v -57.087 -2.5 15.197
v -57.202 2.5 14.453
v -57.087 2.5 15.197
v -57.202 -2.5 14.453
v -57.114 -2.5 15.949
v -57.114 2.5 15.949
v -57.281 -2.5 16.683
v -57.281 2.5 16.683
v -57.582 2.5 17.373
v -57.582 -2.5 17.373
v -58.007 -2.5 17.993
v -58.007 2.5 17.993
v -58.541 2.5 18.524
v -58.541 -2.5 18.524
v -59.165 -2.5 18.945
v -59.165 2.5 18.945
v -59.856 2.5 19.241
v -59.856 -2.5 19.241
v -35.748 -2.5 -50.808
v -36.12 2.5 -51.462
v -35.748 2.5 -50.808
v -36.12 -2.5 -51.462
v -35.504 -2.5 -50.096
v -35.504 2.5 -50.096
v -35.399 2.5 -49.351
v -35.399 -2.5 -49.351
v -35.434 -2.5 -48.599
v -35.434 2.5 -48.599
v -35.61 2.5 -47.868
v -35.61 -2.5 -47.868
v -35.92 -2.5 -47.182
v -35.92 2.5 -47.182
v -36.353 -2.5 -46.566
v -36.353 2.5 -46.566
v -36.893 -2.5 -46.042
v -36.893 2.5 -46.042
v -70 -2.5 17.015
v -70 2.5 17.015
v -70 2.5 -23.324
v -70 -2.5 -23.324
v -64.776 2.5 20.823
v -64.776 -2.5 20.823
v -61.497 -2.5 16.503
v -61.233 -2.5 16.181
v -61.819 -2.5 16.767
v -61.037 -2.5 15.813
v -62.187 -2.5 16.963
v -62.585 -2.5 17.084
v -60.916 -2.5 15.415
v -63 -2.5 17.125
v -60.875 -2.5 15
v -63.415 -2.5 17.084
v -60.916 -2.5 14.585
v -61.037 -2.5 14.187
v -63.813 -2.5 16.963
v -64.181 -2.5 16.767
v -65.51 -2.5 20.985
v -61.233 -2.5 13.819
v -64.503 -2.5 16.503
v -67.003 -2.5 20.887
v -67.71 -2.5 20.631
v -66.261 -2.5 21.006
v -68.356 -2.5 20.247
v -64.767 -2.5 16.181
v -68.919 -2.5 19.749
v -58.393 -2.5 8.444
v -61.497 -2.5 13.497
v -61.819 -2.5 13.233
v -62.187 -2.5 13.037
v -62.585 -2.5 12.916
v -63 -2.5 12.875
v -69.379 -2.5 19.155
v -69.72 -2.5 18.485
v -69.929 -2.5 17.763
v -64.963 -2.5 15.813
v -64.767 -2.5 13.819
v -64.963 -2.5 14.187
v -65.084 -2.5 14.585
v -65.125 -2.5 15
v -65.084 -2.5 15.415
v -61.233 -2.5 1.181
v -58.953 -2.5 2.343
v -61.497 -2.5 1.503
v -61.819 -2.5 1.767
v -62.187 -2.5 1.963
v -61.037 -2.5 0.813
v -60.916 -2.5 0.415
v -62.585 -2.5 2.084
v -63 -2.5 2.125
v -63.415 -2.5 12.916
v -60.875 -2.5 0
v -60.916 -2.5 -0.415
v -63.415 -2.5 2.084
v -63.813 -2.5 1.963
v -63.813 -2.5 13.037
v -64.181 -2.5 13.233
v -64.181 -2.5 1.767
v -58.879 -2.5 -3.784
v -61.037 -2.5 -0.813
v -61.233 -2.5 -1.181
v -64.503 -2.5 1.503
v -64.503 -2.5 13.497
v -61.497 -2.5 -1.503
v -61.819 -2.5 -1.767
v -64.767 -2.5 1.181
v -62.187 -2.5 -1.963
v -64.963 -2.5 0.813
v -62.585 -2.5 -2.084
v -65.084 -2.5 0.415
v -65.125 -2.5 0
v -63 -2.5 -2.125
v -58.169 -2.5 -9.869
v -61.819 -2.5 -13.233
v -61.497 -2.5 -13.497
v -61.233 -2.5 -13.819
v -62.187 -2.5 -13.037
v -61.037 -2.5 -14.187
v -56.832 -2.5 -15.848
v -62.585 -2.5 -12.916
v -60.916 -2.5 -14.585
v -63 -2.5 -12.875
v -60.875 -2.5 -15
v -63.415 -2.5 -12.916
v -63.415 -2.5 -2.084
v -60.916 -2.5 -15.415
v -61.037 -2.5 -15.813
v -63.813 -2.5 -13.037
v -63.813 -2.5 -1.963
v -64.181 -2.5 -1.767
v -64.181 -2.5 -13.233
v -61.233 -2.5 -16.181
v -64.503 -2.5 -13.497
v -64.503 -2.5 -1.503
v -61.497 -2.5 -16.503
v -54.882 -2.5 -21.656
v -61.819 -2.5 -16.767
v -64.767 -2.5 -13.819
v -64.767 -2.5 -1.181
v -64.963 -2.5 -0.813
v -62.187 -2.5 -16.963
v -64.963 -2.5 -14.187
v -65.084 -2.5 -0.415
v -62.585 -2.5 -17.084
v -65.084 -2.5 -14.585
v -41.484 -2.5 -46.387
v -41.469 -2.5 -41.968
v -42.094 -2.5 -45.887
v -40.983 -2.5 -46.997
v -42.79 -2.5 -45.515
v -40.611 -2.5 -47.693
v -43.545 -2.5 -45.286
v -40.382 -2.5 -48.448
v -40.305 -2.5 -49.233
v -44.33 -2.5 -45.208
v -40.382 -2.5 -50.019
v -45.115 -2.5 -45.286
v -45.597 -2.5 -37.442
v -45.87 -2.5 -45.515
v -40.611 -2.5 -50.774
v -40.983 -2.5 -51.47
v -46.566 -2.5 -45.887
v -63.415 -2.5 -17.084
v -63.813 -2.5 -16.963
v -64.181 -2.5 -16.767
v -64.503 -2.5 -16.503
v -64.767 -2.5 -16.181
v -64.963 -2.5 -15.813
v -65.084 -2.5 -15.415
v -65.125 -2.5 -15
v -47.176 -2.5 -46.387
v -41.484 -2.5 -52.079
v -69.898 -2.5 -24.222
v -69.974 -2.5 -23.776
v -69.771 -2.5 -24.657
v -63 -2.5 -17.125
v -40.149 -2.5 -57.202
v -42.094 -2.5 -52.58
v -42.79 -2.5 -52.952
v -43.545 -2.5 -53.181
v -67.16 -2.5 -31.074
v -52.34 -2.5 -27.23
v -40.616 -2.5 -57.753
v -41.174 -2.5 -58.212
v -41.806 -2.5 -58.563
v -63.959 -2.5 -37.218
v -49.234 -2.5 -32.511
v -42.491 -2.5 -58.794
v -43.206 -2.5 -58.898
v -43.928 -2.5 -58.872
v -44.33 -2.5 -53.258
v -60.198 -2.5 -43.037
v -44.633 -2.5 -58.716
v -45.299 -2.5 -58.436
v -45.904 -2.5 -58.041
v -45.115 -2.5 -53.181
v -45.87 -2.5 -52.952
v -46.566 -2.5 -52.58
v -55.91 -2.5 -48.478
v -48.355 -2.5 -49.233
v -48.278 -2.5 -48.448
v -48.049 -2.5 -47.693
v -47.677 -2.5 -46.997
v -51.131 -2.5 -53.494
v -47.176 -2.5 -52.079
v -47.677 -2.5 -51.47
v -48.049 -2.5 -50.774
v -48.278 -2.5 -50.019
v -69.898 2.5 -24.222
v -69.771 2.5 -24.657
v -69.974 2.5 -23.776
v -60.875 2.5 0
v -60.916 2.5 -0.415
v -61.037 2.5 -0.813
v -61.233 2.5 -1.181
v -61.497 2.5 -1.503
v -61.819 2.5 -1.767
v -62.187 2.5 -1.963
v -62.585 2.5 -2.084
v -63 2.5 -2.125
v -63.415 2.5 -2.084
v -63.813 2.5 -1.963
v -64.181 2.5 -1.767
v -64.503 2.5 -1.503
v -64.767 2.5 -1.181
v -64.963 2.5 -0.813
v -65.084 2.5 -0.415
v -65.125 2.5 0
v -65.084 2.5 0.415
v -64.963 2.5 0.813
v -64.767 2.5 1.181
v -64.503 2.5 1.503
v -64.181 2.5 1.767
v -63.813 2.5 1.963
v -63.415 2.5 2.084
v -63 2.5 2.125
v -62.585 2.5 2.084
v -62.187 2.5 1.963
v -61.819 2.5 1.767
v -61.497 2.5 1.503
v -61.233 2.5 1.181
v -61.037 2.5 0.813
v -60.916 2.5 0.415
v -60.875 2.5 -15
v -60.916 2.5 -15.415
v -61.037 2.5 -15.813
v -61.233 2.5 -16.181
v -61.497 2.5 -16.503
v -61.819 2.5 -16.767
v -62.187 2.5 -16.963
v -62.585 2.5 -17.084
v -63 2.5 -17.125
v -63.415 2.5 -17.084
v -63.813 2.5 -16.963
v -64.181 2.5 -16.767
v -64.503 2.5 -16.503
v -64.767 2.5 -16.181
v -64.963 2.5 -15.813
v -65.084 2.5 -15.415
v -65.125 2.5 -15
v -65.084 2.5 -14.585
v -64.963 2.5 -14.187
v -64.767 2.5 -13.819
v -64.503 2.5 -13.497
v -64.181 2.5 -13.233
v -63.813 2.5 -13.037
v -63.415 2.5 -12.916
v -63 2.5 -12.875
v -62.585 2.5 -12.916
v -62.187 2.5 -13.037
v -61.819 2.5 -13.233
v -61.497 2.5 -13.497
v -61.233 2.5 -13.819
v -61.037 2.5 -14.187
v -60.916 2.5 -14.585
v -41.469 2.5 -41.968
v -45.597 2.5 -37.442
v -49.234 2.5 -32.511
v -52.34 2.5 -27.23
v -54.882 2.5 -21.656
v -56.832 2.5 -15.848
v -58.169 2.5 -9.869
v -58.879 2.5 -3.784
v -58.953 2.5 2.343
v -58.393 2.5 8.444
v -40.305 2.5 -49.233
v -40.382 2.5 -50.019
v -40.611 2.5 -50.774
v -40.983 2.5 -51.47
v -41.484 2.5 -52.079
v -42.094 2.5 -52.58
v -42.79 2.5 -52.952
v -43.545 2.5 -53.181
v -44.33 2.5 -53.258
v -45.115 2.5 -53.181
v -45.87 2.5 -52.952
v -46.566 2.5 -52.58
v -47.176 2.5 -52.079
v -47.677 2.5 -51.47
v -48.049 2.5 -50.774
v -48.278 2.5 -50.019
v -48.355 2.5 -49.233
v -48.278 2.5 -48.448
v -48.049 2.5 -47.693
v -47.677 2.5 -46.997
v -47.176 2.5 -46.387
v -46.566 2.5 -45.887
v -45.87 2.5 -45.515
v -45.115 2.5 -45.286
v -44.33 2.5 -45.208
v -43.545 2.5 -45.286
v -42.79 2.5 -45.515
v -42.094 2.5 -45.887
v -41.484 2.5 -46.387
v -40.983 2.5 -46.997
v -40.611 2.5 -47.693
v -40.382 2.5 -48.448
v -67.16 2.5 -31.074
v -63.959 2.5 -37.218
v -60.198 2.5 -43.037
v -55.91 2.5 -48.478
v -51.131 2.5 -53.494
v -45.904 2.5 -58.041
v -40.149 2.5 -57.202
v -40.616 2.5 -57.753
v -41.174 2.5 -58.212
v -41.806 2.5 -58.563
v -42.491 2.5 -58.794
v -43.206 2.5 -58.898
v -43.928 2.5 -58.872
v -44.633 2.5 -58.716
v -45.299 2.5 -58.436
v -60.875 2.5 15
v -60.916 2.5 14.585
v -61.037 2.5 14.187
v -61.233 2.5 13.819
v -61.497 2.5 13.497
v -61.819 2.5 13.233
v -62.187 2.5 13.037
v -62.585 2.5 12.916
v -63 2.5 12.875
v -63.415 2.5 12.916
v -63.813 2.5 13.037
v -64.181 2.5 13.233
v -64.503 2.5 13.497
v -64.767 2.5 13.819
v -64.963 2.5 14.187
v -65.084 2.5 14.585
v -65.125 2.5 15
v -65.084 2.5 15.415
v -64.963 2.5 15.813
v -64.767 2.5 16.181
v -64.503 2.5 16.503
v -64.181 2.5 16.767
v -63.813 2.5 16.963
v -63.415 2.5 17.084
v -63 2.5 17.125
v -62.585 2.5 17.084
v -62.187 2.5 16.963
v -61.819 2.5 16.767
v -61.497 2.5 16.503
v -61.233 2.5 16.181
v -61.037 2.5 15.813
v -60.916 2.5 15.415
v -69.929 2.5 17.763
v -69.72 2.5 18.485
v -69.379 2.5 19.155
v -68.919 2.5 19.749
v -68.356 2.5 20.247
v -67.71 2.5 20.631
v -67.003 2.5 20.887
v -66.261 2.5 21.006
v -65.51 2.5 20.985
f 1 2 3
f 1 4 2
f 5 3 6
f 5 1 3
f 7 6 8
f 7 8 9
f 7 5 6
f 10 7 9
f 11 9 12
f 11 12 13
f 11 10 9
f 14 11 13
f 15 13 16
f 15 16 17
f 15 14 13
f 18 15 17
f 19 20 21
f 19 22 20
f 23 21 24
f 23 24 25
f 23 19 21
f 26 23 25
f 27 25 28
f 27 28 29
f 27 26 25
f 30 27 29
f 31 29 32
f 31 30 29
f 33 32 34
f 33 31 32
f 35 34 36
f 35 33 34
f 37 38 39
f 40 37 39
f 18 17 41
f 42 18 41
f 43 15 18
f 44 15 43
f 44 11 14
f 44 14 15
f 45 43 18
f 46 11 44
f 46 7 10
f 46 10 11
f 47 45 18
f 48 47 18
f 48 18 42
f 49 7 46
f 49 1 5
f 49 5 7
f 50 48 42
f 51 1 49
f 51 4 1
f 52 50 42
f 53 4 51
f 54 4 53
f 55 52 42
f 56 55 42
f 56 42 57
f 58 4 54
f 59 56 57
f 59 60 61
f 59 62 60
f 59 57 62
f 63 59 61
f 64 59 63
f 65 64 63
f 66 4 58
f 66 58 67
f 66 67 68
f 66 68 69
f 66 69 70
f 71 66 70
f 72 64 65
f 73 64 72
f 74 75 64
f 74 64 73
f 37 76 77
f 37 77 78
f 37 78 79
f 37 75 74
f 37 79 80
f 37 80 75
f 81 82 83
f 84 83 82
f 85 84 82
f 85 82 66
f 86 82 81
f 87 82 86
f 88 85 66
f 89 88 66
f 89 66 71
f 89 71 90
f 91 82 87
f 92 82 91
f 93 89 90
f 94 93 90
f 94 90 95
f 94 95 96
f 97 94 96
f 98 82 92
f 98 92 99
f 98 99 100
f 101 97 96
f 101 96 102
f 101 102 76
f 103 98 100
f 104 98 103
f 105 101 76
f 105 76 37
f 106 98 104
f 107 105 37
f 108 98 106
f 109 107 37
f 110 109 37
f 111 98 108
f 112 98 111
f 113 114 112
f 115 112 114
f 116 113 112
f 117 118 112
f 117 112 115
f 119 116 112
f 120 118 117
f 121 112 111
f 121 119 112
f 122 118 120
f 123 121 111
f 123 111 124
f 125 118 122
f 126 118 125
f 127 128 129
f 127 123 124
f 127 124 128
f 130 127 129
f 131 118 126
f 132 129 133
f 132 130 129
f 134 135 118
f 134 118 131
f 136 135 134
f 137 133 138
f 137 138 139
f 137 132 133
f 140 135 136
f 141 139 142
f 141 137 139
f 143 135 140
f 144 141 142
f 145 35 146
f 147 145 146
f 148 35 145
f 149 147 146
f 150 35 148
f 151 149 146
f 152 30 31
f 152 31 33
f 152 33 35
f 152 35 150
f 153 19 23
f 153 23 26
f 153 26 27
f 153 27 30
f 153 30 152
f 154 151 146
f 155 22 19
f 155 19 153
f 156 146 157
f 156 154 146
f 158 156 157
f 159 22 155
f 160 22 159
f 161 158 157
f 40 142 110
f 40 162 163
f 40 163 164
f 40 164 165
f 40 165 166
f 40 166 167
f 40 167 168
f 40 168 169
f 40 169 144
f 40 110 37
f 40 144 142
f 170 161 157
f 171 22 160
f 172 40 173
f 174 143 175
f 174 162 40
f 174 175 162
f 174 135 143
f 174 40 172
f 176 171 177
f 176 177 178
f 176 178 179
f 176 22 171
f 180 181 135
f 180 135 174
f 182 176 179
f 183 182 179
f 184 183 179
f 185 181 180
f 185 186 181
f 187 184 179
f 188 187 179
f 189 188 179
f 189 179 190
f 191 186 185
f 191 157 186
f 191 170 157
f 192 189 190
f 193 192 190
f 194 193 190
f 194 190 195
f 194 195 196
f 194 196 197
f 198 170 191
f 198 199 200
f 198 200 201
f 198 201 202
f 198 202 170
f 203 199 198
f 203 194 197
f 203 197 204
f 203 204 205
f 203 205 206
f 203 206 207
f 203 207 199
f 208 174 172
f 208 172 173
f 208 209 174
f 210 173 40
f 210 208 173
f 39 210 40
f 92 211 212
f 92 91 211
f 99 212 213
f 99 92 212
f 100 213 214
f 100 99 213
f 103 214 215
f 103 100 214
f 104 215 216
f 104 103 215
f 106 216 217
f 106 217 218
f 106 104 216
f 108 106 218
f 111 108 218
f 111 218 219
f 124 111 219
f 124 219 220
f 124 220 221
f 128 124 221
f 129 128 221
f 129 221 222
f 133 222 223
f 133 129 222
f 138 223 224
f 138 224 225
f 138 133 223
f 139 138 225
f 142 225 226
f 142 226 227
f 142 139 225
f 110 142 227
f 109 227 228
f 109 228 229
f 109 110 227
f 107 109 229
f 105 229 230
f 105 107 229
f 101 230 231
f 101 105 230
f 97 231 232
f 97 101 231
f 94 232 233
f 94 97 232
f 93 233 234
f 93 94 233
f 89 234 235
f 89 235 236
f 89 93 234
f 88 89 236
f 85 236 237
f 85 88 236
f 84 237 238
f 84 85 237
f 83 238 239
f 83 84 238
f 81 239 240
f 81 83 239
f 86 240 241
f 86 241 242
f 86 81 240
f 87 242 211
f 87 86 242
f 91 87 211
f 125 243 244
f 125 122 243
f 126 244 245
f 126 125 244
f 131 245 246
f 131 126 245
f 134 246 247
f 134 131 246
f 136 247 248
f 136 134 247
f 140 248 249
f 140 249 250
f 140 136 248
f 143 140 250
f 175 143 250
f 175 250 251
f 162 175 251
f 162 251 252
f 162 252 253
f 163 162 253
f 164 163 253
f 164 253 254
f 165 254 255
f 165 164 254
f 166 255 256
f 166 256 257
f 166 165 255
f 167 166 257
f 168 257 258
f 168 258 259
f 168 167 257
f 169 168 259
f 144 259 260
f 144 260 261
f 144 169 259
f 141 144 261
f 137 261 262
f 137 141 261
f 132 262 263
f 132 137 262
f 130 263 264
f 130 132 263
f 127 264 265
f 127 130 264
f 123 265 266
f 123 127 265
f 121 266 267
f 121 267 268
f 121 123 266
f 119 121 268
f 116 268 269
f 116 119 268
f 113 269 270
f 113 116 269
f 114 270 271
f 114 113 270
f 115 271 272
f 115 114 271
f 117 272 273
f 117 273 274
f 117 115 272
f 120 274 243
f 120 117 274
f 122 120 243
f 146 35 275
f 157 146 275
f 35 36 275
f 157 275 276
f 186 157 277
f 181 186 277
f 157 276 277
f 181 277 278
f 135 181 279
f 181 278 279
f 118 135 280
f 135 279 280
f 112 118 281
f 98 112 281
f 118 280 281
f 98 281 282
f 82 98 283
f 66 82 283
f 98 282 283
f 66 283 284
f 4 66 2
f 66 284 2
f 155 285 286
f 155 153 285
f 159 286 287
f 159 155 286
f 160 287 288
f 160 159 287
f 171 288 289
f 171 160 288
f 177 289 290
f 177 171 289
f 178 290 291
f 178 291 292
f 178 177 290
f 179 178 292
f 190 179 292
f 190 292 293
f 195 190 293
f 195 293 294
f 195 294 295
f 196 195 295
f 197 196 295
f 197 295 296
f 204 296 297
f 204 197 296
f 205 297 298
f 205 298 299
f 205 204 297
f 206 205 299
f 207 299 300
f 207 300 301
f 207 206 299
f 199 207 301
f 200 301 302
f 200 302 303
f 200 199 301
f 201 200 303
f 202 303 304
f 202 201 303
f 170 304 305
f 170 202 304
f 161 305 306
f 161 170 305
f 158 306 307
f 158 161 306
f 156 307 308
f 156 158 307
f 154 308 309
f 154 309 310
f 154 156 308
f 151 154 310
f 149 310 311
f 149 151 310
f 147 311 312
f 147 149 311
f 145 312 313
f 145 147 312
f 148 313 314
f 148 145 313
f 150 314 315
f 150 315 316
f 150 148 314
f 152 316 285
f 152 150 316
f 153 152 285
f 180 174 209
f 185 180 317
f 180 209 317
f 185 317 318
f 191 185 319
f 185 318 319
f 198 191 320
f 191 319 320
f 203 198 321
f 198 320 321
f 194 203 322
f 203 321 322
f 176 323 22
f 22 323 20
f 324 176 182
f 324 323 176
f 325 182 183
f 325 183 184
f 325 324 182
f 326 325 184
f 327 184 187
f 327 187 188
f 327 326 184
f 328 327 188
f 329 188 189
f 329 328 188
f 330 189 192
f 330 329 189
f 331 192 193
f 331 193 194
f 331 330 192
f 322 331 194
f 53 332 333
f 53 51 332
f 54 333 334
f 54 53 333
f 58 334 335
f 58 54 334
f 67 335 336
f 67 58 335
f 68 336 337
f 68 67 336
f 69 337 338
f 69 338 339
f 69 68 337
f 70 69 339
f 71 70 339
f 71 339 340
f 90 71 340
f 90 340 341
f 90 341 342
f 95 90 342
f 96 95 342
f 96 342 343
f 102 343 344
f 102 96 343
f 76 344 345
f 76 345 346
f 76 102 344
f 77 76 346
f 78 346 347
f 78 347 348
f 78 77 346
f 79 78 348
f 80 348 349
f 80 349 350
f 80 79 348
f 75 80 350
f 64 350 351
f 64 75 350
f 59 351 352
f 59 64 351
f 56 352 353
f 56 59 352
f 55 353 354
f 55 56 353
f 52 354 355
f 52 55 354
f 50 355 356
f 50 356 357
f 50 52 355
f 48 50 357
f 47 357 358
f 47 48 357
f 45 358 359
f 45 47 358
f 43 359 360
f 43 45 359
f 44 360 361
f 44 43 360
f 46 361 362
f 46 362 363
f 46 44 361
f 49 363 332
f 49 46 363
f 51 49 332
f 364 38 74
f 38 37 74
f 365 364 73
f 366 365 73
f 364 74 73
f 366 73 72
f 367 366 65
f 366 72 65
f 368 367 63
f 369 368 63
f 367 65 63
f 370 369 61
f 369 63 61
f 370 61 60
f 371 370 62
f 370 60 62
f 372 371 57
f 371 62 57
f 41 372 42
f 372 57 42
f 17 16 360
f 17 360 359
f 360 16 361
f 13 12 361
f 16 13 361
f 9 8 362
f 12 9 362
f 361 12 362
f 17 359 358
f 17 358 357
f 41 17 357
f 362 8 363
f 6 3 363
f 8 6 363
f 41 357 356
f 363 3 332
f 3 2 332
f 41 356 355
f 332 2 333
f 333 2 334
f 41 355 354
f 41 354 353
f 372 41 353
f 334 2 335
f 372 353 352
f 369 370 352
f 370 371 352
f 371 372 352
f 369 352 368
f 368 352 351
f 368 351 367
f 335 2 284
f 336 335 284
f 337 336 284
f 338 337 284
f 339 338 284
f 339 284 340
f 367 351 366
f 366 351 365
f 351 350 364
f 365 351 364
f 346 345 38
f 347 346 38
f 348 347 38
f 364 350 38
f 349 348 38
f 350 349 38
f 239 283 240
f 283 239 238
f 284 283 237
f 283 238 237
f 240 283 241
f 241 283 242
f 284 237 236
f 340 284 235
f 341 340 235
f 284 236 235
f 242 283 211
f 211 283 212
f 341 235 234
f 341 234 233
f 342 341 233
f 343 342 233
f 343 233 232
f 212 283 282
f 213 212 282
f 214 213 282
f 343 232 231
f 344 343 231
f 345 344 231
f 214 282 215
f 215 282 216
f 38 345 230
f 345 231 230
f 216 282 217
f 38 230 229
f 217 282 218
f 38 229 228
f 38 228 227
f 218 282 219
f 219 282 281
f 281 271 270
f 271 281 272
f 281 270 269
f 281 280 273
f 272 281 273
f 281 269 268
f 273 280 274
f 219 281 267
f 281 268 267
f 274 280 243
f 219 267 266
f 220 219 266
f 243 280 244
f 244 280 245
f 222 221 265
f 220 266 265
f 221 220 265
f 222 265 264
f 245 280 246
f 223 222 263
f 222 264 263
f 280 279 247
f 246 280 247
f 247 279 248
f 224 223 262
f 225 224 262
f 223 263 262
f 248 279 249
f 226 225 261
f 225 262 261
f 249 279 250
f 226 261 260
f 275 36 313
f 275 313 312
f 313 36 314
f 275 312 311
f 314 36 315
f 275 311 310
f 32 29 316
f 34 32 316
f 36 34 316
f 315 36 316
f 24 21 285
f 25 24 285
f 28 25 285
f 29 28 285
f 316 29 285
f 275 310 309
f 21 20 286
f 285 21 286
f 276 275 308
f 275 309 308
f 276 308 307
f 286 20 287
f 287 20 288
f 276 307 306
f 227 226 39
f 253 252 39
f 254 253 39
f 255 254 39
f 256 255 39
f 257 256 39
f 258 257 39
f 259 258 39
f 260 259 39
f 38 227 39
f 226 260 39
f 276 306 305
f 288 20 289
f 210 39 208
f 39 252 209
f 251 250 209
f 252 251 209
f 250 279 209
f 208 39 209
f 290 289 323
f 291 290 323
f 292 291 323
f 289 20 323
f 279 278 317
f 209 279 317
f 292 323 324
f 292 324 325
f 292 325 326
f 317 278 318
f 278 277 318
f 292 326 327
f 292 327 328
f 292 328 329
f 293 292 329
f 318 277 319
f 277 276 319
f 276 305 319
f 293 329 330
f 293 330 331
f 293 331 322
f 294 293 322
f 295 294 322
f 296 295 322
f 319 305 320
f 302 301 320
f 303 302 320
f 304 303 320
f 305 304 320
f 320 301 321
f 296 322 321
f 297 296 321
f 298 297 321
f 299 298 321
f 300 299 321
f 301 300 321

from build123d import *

# Parameters (mm, degrees)
SKETCH1_R               = 4.025
SKETCH1_R_2             = 2.125
BOSS_EXTRUDE1_DEPTH     = 2.5
SKETCH2_W               = 28.904595792
SKETCH2_H               = 55.332112
CUT_EXTRUDE1_DEPTH      = 1
CUT_EXTRUDE1_DEPTH_BACK = 6
FILLET1_R               = 4


with BuildPart() as part:
    # Sketch1 → Boss-Extrude1 (new body, symmetric)
    with BuildSketch(Plane(origin=(0, 0, 0), x_dir=(1, 0, 0), z_dir=(0, 1, 0))):
        with BuildLine():
            Line((-42.512697833, 60.569551121), (-33.895259083, 48.291939407))
            ThreePointArc((-33.895259083, 48.291939407), (-55.932258345, 18.777179671), (-56.169167779, -18.056151058))
            Line((-56.169167779, -18.056151058), (-70.449464672, -22.646697938))
            ThreePointArc((-70.449464672, -22.646697938), (-70.152324026, 23.55103891), (-42.512697833, 60.569551121))
        make_face()
        with Locations((-44.329902671, 49.233344688)):
            Circle(SKETCH1_R, mode=Mode.SUBTRACT)
        with Locations((-63, 0)):
            Circle(SKETCH1_R_2, mode=Mode.SUBTRACT)
        with Locations((-63, -15)):
            Circle(SKETCH1_R_2, mode=Mode.SUBTRACT)
        with Locations((-63, 15)):
            Circle(SKETCH1_R_2, mode=Mode.SUBTRACT)
    extrude(amount=BOSS_EXTRUDE1_DEPTH, both=True)

    # Sketch2 → Cut-Extrude1 (cut, two sides)
    with BuildSketch(Plane(origin=(0, 2.5, 0), x_dir=(1, 0, 0), z_dir=(0, 1, 0))) as cut_extrude1_sk:
        with Locations((-84.452297896, 0)):
            Rectangle(SKETCH2_W, SKETCH2_H)
    extrude(amount=CUT_EXTRUDE1_DEPTH, mode=Mode.SUBTRACT)
    extrude(cut_extrude1_sk.sketch, amount=-CUT_EXTRUDE1_DEPTH_BACK, mode=Mode.SUBTRACT)

    # Fillet1
    fillet1_edges = [part.edges().sort_by_distance(p)[0] for p in [
        (-70, 0, 22.502212941),
        (-70, 0, -24),
        (-42.512697833, 0, -60.569551121),
        (-33.895259083, 0, -48.291939407),
        (-56.169167779, 0, 18.056151058),
    ]]
    fillet(fillet1_edges, radius=FILLET1_R)


solid = part.part
